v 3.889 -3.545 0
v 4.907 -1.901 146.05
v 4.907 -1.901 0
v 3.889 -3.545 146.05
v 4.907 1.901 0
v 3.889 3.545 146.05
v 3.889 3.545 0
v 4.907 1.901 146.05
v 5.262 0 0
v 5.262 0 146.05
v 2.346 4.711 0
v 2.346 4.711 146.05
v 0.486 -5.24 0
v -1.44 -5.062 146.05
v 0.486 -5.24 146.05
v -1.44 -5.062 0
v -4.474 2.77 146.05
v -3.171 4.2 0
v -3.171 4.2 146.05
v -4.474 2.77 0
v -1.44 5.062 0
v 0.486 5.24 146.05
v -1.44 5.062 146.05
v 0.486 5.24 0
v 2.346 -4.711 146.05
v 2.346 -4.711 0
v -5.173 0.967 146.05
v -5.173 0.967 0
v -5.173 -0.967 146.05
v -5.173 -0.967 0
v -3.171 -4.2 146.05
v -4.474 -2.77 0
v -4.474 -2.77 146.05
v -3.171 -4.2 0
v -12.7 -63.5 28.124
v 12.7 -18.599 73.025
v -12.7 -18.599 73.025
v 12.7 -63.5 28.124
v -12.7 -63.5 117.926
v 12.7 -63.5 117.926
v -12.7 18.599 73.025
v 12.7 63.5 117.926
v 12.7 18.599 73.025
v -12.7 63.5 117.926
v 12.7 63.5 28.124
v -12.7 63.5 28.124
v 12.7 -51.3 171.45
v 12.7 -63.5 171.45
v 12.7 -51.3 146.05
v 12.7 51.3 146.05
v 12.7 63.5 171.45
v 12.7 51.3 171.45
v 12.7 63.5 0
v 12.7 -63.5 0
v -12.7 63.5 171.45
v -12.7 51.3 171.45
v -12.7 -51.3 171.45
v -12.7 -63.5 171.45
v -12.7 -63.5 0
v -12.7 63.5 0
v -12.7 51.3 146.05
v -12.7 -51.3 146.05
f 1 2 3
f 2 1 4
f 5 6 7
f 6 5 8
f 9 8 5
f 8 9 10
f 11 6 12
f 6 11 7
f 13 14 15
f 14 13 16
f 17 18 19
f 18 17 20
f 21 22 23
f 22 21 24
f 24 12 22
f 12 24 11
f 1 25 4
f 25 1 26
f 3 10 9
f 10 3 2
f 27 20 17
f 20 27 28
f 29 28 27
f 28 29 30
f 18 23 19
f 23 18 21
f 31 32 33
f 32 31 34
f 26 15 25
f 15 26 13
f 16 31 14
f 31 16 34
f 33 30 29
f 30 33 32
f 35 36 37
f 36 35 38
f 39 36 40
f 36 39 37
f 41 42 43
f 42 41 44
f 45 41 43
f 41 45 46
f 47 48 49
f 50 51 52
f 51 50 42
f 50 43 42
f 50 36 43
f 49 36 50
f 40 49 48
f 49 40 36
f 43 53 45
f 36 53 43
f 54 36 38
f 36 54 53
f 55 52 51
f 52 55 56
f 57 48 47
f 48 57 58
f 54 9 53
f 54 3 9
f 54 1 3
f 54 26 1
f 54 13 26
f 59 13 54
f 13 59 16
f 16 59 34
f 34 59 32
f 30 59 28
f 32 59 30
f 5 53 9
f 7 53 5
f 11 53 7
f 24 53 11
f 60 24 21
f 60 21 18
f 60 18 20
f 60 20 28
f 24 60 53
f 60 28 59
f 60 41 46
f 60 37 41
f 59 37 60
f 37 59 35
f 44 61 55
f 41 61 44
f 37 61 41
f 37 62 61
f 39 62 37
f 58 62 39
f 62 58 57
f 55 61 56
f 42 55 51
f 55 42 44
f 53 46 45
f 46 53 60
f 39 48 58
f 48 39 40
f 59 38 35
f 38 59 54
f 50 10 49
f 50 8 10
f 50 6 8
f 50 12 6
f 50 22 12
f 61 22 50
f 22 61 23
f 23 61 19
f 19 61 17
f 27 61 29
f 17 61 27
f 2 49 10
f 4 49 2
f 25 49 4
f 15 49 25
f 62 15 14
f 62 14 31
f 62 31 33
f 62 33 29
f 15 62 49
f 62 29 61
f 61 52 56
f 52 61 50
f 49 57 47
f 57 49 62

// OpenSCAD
// Units are mm.

function i2mm(x) = x * 0.0254 * 1000;

t = i2mm(1);
fudge = 1;
diam = i2mm(3/8) + fudge; // hole diameter
h = i2mm(6.75); // height
cutout_depth = i2mm(4) + fudge; // depth of board placed within cutout.
cutout_height = i2mm(1);
depth = i2mm(5);
cutout_dim = i2mm(2.5);
cutout_y = -i2mm(0.5);

difference() {
    translate([0, 0, h / 2])
        cube(size=[t, depth, h], center=true);
    translate([0, 0, h])
        cube(size=[2 * t, cutout_depth, cutout_height * 2], center=true);
    translate([0, 0, h / 2]) {
        cylinder(r = diam / 2, h = 2 * h, center = true);
        translate([0, -depth / 2, cutout_y])
            rotate([45, 0, 0])
                cube(size = [cutout_dim, cutout_dim, cutout_dim], center = true);
        translate([0, depth / 2, cutout_y])
            rotate([45, 0, 0])
                cube(size = [cutout_dim, cutout_dim, cutout_dim], center = true);
    }
}
